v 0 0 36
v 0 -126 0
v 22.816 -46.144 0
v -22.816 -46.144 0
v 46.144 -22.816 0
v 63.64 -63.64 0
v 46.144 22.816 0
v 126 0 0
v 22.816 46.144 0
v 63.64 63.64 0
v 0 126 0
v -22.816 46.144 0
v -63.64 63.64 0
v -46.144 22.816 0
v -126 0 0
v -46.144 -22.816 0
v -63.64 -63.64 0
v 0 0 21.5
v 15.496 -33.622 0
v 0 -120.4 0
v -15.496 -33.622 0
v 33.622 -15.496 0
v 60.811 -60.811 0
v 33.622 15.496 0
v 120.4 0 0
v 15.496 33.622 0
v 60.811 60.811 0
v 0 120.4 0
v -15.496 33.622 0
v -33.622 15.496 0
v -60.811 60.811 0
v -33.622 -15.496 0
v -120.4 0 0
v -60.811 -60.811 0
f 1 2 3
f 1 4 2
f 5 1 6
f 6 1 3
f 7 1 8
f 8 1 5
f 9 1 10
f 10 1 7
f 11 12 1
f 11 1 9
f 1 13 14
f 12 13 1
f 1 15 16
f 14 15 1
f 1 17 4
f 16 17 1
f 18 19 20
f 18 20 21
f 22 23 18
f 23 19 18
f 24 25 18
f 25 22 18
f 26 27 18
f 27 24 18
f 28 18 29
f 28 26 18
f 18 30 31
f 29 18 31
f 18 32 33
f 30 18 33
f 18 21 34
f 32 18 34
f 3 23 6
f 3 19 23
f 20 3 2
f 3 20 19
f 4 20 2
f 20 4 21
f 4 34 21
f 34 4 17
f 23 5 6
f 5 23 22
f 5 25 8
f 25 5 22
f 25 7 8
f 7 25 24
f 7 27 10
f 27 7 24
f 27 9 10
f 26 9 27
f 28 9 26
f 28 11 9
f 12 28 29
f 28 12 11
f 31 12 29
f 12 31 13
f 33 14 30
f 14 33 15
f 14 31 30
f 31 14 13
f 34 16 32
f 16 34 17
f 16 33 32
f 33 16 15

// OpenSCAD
// SPDX-License-Identifier: MIT

$fa = 1;
$fs = 0.4;

module star(lpoint=14,spoint=9,npoints=4,depth=3,miniSize=0) {
	// each point is a 4 sided cone
	difference() {
		for (point=[0:npoints-1]) {
			// long point
			rotate([0,(360/npoints)*point,0]) cylinder(lpoint,depth,0,$fn=4);
			// short point
			rotate([0,(180/npoints)+(360/npoints)*point,0]) cylinder(spoint,depth,0,$fn=4);
			if (miniSize > 0) {
				rotate([0,((180/npoints)+(90/npoints))+(360/npoints)*point,0]) cylinder(miniSize,depth,0,$fn=4);
				rotate([0,((180/npoints)-(90/npoints))+(360/npoints)*point,0]) cylinder(miniSize,depth,0,$fn=4);
			}
		}
	}
}

// The star, with a flat back
module mainstar(lpoint=14, spoint=9, npoints=4, depth=3, miniSize=0, scale=1, loop=false, hollow=false, hangers=false) {

	intersection() {
		union() {
			if (hollow == true) {
				difference() {
					scale([scale, scale, scale])
						rotate([90, 0, 0]) star(spoint = 10, depth = depth);
					translate([0, 0, -1])
						scale([scale, scale, scale])
						if (scale == 1) {
							rotate([90, 0, 0]) star(spoint = 10, depth = depth - 0.05);
						}
						else {
							rotate([90, 0, 0]) star(spoint = 10, depth = depth - 1.5);
						}

				}
			}
			else {
				scale([scale, scale, scale])
				rotate([90, 0, 0])star(lpoint, spoint, npoints, depth, miniSize);
			}

			if (hangers == true) {
				if (scale == 3) {
					s = scale*0.15;
					translate([((scale * 2.5)), (((scale * 3.75) + (s / 2)) - 0.001), (scale * 0.15)])
						scale([s, s, s])
							rotate([90, 0, 0])rotate([90, 0, 0])
								rotate_extrude(convexity = 10, $fn = 100)
									translate([4, 0, 0]) circle(r = 1, $fn = 4);
					translate([(-(scale * 2.5)), (((scale * 3.75) + (s / 2)) - 0.001), (scale * 0.15)])
						scale([s, s, s])
							rotate([90, 0, 0])rotate([90, 0, 0])
								rotate_extrude(convexity = 10, $fn = 100)
									translate([4, 0, 0]) circle(r = 1, $fn = 4);
					translate([((scale * 2.5)), ((-(scale * 3.75) - (s / 2)) - 0.001), (scale * 0.15)])
						scale([s, s, s])
							rotate([90, 0, 0])rotate([90, 0, 0])
								rotate_extrude(convexity = 10, $fn = 100)
									translate([4, 0, 0]) circle(r = 1, $fn = 4);
					translate([(-(scale * 2.5)), ((-(scale * 3.75) - (s / 2)) - 0.001), (scale * 0.15)])
						scale([s, s, s])
							rotate([90, 0, 0])rotate([90, 0, 0])
								rotate_extrude(convexity = 10, $fn = 100)
									translate([4, 0, 0]) circle(r = 1, $fn = 4);
				}
				else {
					s = scale * 0.15;
					translate([((scale * 2.5)), (((scale * 3.75) + s) - 0.001), (scale * 0.15)])
						scale([s, s, s])
							rotate([90, 0, 0])rotate([90, 0, 0])
								rotate_extrude(convexity = 10, $fn = 100)
									translate([4, 0, 0]) circle(r = 1, $fn = 4);
					translate([(-(scale * 2.5)), (((scale * 3.75) + s) - 0.001), (scale * 0.15)])
						scale([s, s, s])
							rotate([90, 0, 0])rotate([90, 0, 0])
								rotate_extrude(convexity = 10, $fn = 100)
									translate([4, 0, 0]) circle(r = 1, $fn = 4);
					translate([((scale * 2.5)), ((-(scale * 3.75) - s) - 0.001), (scale * 0.15)])
						scale([s, s, s])
							rotate([90, 0, 0])rotate([90, 0, 0])
								rotate_extrude(convexity = 10, $fn = 100)
									translate([4, 0, 0]) circle(r = 1, $fn = 4);
					translate([(-(scale * 2.5)), ((-(scale * 3.75) - s) - 0.001), (scale * 0.15)])
						scale([s, s, s])
							rotate([90, 0, 0])rotate([90, 0, 0])
								rotate_extrude(convexity = 10, $fn = 100)
									translate([4, 0, 0]) circle(r = 1, $fn = 4);
				}
			}

			//If you're building a star to hang from the tree, add a loop at the top
			if (loop == true) {
				var_scale = (scale/2);
				scale([var_scale, var_scale, var_scale])
					translate([0, -31, 0])
						rotate([90, 0, 0])rotate([90, 0, 0])
							rotate_extrude(convexity = 10, $fn = 100)
								translate([4, 0, 0]) circle(r = 1, $fn = 4);
			}
		}
		scale([scale, scale, scale])
			translate([0, 0, 50])cube([150, 150, 100], center = true);
	}
}

// Build the star
scale=9;
hollow=true;
hangers=false;
magnets=false;
difference() {
	mainstar(depth=4, scale=scale, hollow=hollow, hangers=hangers);

	// Insets for magnets
	if (magnets == true) {
		translate([scale*2.10, scale*4.6, 0])
			color("purple")cylinder(d=6, h=1);
		translate([scale*2.10, -(scale*4.6), 0])
			color("orange")cylinder(d=6, h=1);
		translate([-(scale*2.10), scale*4.6, 0])
			color("green")cylinder(d=6, h=1);
		translate([-(scale*2.10), -(scale*4.6), 0])
			color("blue")cylinder(d=6, h=1);
	}

}
